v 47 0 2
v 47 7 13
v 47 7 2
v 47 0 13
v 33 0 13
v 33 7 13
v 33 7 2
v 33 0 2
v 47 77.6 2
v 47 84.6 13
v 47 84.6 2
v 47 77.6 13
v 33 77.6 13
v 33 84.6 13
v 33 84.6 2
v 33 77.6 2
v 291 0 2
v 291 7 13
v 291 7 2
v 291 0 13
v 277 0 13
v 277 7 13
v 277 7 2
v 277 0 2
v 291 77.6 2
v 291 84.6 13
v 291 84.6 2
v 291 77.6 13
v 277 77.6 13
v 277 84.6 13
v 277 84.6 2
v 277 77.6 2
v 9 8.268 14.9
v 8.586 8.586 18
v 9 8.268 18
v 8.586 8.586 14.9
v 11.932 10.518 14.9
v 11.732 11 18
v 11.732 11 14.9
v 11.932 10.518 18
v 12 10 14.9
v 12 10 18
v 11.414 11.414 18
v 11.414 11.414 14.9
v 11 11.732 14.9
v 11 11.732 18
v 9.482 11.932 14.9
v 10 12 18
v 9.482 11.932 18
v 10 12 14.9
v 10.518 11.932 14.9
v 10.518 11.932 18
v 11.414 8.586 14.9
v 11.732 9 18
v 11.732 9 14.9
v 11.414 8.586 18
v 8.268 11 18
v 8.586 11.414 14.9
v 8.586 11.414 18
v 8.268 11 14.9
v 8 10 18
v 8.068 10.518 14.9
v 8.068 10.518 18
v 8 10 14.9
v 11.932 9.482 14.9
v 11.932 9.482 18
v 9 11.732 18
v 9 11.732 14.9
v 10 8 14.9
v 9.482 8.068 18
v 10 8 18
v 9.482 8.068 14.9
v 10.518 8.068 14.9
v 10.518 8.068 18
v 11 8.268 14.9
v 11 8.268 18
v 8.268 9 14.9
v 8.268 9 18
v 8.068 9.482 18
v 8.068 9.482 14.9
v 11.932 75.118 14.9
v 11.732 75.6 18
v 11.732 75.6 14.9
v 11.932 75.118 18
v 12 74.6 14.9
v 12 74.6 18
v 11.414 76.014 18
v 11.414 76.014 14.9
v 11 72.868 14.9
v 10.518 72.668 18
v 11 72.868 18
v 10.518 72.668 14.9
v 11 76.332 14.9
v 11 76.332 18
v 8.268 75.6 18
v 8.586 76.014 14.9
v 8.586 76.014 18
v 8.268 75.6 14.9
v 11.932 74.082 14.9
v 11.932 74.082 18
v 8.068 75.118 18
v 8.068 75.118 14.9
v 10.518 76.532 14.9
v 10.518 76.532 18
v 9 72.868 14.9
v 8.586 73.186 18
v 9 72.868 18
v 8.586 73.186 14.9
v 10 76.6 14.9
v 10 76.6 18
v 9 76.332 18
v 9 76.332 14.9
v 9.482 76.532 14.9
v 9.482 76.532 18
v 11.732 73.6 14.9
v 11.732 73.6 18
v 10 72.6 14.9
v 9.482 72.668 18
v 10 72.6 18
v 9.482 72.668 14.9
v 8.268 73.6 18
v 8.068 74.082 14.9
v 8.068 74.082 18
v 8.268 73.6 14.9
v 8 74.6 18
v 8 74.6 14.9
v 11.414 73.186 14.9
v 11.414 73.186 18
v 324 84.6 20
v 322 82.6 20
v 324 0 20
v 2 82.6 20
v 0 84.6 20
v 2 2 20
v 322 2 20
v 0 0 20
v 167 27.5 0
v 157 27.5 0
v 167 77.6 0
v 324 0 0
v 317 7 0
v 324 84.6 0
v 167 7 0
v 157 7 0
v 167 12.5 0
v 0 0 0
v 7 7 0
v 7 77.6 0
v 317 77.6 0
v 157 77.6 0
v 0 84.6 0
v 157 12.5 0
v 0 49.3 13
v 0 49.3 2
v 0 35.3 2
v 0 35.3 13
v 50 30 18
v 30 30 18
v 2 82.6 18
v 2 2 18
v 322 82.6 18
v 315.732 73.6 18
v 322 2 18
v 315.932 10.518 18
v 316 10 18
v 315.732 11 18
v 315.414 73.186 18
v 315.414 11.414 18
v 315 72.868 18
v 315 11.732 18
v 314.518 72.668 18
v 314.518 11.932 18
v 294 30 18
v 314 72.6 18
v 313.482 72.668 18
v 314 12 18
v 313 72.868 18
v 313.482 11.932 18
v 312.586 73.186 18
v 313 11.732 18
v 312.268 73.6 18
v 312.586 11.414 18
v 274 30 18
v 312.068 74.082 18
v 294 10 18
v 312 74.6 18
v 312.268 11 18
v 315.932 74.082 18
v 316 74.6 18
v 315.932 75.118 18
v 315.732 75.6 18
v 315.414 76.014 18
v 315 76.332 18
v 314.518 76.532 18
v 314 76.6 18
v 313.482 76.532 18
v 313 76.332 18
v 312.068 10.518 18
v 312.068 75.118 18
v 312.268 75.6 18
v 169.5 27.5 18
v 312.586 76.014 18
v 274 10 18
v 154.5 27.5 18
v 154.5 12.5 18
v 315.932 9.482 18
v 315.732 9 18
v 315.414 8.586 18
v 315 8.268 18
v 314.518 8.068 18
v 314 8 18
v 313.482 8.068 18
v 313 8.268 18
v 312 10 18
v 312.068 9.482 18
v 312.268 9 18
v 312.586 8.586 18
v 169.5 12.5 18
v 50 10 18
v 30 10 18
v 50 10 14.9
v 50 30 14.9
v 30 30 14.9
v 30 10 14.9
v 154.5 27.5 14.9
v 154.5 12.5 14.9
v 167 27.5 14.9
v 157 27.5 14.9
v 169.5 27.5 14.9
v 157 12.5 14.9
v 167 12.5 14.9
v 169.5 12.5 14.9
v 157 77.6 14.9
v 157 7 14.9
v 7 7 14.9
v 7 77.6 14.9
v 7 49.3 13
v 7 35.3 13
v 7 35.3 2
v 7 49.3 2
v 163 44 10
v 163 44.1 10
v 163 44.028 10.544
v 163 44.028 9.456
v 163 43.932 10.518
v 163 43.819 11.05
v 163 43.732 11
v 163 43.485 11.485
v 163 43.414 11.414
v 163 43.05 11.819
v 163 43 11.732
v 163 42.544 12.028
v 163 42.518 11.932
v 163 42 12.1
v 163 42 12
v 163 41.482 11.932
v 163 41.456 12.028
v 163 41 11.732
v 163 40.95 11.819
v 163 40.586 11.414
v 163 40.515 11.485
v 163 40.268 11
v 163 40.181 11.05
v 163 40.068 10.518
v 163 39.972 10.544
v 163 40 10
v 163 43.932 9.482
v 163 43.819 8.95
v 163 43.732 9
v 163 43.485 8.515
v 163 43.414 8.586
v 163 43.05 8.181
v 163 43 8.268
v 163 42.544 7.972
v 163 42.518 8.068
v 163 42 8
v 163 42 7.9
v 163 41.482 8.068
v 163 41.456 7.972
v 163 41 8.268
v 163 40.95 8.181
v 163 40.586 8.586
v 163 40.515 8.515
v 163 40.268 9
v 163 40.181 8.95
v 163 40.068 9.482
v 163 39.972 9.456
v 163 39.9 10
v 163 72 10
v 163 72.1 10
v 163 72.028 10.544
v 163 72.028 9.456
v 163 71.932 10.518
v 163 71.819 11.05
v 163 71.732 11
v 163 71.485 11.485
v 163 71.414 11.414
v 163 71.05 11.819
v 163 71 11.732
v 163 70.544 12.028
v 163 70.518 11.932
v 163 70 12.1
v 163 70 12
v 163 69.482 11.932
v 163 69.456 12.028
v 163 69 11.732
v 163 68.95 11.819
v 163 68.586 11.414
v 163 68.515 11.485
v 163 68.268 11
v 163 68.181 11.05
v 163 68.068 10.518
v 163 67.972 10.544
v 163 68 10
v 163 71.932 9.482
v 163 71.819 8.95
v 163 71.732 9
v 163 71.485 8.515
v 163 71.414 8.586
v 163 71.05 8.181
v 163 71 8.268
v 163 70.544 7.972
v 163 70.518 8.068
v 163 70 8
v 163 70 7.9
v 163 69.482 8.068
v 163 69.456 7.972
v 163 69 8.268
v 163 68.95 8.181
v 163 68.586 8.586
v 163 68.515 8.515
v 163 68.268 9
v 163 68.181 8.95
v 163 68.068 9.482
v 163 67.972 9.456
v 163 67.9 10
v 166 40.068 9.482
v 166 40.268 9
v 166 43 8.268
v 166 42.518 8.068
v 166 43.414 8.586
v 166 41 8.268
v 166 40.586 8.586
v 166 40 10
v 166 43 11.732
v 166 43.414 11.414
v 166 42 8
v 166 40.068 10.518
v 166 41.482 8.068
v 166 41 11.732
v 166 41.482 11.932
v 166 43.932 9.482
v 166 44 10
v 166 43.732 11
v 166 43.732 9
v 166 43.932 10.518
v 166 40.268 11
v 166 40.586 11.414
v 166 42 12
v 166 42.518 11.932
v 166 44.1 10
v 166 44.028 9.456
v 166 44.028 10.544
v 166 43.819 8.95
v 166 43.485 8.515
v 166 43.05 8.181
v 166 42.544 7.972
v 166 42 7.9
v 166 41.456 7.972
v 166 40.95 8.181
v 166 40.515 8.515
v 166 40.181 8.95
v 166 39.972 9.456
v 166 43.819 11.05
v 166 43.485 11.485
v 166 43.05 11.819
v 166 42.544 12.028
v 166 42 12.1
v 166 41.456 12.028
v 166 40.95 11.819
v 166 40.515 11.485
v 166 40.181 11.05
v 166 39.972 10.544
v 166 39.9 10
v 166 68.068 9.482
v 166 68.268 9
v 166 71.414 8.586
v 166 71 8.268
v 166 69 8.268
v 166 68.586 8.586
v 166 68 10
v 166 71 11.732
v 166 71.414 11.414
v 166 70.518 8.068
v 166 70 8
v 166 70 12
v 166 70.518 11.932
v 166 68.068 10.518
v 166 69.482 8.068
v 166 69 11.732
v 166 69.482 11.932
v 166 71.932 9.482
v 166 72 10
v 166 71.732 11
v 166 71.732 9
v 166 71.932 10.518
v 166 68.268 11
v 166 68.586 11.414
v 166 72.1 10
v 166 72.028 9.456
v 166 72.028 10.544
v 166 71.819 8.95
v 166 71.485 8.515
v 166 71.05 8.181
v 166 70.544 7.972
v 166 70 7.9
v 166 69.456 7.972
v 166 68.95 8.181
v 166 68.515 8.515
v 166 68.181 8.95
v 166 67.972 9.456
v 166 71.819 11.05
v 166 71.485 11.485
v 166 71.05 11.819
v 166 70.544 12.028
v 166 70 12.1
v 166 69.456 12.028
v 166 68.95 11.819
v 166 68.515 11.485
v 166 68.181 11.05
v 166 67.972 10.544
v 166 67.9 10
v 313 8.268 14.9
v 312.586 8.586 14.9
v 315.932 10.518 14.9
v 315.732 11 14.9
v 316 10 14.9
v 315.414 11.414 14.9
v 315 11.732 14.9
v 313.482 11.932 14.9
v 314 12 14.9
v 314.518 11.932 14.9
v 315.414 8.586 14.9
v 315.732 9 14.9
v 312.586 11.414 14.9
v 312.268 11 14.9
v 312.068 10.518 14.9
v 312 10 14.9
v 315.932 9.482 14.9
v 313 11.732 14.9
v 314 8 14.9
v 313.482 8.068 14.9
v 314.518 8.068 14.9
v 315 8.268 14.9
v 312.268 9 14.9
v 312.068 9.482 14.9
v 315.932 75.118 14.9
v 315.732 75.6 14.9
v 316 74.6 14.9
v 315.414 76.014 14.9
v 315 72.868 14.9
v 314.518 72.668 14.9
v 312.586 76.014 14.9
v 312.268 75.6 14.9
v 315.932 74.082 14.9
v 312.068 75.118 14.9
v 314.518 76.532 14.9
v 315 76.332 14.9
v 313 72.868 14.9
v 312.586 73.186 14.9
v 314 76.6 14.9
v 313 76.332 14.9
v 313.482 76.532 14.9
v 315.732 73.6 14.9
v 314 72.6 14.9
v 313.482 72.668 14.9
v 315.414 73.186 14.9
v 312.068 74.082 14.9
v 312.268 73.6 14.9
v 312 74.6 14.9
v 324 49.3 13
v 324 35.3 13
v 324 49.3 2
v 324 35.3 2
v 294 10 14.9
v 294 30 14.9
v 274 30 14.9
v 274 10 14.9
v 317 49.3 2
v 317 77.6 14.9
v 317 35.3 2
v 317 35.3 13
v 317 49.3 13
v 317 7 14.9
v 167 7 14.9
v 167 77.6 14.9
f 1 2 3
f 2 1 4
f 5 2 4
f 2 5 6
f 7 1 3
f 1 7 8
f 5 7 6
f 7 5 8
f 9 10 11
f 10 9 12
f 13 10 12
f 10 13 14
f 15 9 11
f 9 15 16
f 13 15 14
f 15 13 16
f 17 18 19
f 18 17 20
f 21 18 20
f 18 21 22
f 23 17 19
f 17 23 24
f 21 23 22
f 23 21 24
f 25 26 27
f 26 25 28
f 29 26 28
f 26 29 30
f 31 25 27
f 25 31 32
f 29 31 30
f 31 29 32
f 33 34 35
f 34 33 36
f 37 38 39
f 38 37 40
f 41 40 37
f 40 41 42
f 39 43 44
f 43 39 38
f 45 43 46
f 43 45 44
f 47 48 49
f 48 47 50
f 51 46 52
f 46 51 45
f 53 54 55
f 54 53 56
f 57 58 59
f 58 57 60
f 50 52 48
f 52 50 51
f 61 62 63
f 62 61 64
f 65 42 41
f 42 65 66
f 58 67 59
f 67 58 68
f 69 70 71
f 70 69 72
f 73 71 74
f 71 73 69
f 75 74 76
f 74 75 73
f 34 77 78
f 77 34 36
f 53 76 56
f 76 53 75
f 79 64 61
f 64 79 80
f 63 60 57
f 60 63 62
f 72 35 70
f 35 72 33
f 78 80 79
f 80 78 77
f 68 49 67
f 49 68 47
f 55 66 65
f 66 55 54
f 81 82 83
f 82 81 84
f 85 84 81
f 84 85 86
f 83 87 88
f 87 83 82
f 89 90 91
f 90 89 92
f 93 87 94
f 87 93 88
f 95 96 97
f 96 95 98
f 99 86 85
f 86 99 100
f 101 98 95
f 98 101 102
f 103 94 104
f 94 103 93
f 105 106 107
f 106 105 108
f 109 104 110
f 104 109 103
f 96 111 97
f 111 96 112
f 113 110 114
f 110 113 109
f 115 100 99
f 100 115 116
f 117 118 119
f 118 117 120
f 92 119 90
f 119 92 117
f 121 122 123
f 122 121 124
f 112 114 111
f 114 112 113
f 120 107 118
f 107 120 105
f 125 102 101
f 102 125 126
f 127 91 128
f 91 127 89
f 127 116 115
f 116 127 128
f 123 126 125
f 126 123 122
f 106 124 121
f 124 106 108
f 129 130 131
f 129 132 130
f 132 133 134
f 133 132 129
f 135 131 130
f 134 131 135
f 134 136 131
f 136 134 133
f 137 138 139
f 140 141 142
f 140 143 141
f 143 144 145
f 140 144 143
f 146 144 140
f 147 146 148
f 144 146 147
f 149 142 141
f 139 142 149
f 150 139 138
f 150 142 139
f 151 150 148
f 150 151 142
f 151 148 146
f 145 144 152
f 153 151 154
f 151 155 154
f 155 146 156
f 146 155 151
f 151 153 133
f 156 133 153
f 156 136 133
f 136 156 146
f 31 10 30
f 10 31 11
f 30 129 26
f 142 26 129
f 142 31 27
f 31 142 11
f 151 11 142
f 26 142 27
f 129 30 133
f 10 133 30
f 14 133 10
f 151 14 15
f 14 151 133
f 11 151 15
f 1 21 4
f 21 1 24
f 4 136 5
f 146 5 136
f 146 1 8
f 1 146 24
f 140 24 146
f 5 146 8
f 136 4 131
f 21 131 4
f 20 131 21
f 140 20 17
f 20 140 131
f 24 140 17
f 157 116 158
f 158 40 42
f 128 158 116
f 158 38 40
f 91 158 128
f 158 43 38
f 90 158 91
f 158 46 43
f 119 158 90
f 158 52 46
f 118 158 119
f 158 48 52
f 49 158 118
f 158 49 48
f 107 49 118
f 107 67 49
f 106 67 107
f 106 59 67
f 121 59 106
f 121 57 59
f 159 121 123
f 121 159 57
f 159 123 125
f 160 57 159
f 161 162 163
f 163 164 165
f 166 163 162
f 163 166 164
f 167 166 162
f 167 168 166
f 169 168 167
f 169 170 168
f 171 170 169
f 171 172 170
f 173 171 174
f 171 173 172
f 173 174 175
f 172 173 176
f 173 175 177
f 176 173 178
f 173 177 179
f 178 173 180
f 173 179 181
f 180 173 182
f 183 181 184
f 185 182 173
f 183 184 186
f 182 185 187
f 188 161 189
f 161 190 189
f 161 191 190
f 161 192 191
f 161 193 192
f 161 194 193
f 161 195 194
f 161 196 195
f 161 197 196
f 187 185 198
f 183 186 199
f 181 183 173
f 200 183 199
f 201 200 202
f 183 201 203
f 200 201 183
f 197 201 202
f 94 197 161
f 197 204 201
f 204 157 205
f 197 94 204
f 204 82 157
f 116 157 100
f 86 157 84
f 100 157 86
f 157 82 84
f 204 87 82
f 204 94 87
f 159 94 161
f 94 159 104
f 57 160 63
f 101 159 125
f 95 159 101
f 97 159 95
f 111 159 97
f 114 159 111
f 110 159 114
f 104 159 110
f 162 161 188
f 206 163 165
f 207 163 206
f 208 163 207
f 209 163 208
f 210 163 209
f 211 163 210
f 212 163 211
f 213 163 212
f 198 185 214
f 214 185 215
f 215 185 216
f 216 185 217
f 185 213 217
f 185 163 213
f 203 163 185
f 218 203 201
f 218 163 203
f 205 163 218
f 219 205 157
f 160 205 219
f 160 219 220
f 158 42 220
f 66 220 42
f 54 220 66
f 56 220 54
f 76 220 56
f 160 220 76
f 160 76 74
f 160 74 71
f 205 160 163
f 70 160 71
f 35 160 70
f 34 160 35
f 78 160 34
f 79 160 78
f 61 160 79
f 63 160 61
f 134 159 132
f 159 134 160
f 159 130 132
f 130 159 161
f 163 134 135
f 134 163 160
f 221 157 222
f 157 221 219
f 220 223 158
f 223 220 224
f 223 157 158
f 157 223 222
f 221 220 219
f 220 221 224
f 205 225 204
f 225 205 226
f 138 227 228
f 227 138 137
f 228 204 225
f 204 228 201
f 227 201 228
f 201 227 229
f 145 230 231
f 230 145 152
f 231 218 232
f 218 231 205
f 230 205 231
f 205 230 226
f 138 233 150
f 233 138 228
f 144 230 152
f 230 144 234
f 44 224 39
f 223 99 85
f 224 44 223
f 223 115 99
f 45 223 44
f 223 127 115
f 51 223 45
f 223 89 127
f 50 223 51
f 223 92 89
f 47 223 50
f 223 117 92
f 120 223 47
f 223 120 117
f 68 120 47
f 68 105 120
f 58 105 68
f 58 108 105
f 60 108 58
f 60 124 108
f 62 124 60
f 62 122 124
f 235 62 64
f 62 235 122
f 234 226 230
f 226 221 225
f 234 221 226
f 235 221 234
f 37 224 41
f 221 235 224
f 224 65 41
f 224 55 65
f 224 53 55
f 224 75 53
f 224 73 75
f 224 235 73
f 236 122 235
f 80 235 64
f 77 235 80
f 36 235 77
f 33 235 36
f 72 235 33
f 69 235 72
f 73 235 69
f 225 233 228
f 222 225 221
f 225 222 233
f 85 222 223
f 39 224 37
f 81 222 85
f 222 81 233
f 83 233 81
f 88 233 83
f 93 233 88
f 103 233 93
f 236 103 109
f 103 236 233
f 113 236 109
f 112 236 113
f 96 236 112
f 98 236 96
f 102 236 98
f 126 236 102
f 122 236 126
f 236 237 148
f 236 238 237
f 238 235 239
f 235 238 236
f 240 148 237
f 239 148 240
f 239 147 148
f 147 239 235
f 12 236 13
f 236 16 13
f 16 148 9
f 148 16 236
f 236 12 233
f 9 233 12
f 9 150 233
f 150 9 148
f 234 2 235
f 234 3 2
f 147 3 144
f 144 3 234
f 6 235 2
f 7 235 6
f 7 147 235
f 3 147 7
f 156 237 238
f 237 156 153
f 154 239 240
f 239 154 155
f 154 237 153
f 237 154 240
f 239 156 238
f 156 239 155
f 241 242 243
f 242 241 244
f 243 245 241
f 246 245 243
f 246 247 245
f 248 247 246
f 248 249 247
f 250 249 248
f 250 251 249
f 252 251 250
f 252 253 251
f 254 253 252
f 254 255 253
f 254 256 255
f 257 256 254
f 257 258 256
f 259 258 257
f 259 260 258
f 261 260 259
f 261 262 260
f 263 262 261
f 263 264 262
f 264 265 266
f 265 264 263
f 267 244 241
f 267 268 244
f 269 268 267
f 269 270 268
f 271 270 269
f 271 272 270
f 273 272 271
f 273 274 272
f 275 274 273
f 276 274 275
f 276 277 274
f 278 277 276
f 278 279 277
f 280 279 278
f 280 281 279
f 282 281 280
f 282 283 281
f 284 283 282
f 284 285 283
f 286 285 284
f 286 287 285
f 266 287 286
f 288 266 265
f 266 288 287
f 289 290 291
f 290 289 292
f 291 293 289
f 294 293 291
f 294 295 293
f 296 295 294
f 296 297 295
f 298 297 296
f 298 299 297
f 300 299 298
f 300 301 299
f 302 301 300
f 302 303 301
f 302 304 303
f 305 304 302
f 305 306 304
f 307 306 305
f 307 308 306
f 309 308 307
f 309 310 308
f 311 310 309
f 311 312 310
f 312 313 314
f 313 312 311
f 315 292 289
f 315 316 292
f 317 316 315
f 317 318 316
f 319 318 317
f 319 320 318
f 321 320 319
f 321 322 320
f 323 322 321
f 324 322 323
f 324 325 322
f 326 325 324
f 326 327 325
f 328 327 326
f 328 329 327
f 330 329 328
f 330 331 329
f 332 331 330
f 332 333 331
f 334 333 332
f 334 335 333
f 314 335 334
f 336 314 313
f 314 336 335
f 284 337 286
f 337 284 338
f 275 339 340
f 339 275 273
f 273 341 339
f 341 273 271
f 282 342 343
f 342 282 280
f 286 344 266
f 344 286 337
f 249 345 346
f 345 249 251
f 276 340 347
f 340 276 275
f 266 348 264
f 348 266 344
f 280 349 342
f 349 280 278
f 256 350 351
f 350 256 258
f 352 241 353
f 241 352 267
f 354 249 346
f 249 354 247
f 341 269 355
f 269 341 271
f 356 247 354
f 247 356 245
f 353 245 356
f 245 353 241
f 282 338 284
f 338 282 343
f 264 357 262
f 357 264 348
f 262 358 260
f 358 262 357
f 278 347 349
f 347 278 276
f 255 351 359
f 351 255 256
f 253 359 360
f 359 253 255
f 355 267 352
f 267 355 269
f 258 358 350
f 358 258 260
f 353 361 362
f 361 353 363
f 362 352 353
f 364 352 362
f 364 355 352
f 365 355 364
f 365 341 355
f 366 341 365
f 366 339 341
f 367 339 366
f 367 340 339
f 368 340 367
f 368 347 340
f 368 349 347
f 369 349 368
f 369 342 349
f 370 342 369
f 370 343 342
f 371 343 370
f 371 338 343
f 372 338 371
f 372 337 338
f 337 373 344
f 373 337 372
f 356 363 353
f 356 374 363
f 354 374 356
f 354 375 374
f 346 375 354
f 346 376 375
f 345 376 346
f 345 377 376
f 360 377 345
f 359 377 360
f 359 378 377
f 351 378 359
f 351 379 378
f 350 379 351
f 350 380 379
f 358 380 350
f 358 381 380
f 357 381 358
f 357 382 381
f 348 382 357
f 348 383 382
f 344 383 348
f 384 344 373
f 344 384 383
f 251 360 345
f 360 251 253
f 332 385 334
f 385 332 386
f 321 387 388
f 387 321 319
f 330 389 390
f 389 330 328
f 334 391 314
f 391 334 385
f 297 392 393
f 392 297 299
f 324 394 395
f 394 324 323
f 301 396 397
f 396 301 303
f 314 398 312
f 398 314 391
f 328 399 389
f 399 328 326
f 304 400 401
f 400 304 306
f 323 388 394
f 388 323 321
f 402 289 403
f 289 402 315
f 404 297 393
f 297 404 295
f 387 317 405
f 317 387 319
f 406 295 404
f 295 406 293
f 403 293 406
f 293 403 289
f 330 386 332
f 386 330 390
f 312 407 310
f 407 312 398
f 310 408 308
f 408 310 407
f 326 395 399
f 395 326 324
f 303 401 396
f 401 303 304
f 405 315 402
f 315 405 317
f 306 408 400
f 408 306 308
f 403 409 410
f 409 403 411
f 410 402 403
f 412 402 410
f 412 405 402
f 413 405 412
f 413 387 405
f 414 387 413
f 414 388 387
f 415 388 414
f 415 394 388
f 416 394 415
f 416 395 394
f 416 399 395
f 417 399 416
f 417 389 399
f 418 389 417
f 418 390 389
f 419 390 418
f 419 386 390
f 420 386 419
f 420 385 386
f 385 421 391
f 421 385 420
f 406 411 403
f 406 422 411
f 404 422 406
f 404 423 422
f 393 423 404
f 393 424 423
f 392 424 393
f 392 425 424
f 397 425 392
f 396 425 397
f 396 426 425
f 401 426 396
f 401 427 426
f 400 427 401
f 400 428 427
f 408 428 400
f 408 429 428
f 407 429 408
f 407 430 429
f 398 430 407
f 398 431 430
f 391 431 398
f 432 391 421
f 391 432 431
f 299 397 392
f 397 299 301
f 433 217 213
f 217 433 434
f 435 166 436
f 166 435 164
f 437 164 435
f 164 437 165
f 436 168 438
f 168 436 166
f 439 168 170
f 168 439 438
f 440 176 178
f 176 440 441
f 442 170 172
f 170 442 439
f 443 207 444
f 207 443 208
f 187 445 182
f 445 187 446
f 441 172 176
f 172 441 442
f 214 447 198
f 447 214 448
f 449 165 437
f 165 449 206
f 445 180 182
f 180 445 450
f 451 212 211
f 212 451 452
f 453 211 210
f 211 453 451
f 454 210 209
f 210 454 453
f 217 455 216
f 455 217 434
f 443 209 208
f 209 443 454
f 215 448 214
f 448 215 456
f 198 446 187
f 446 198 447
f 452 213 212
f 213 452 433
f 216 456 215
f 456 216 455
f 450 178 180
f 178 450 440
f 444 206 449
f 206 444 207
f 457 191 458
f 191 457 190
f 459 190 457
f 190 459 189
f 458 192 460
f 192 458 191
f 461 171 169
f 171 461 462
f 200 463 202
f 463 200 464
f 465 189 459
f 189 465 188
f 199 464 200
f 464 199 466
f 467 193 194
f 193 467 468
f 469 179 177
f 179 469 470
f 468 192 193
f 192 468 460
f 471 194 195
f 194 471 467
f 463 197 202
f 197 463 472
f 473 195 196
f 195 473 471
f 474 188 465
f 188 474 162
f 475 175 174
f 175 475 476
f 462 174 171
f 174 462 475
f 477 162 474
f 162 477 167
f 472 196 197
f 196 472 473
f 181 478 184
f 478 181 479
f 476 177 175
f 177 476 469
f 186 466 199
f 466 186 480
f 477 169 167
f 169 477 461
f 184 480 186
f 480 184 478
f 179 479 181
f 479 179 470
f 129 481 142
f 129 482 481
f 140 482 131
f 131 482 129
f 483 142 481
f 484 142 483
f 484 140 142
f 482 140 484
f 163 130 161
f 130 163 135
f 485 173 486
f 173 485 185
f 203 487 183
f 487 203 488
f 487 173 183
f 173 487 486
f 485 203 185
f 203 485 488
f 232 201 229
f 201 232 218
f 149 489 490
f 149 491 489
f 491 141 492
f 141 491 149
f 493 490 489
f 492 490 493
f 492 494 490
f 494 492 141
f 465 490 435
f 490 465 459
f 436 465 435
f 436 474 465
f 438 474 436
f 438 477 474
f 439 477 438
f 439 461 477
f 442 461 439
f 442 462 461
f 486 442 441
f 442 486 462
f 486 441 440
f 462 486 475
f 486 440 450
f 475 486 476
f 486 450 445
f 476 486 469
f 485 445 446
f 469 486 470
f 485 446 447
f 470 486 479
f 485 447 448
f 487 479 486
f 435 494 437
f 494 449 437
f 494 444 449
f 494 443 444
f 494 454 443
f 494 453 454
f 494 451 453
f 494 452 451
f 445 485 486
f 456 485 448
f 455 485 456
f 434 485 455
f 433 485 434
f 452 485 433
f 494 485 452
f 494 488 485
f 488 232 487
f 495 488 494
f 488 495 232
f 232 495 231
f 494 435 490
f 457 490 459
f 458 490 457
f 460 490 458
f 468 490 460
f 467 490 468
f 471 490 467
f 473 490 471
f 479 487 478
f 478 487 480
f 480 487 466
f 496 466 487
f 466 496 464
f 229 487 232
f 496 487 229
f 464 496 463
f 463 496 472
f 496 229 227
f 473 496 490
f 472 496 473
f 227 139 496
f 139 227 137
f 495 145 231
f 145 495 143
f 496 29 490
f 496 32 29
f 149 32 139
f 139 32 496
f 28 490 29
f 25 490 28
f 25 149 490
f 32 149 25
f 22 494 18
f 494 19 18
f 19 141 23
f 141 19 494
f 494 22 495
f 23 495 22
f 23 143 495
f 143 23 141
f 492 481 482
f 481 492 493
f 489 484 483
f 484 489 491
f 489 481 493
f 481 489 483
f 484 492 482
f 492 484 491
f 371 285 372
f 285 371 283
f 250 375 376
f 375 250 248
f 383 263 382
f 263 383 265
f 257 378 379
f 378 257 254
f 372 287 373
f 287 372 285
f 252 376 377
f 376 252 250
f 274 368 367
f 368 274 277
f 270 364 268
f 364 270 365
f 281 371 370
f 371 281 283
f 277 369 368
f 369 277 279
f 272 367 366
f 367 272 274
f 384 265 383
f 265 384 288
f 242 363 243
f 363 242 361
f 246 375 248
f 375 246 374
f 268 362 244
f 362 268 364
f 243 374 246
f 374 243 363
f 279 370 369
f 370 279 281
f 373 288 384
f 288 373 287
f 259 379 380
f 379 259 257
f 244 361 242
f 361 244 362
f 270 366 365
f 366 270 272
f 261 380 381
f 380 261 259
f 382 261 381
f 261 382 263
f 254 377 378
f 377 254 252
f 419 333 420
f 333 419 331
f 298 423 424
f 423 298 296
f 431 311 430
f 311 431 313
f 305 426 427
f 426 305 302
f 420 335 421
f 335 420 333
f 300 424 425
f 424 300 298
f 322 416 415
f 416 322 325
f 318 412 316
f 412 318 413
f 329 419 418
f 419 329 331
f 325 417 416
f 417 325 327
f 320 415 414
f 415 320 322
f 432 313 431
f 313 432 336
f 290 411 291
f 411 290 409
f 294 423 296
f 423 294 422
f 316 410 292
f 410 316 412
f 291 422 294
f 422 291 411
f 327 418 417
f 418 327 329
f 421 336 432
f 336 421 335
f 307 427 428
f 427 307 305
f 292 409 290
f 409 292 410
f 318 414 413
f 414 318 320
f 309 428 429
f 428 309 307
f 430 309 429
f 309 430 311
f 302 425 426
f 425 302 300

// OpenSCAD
/*
 * 8x32 LED Panel Housing - SPLIT VERSION
 * For printers with < 324mm build volume
 * Splits 324mm housing into 2× 162mm pieces with alignment
 */

// Include or copy the base design parameters
panel_length = 320;
panel_width = 80.6;
panel_thickness = 1.5;
housing_length = panel_length + 4;
housing_width = panel_width + 4;
housing_depth = 20; // Increased from 16mm to 20mm for more wire space
wall_thickness = 2; // Restored to 2mm (was 7mm, causing missing wall)
led_channel_depth = 2;
led_channel_width = panel_width;
led_channel_length = panel_length;
// ADJUST THIS PARAMETER to change the square hole size
wire_hole_size = 20; 
wire_channel_width = 14; // Increased from 10mm to 14mm
wire_channel_depth = 11; // Deeper wire channels
mounting_hole_dia = 4;
mounting_hole_inset = 10;

// Split parameters
split_position = housing_length / 2;  // Split in middle
alignment_pin_dia = 4;
alignment_pin_depth = 4;
alignment_pin_tolerance = 0.2;

module half_housing(is_left_half = true) {
    difference() {
        union() {
            // Half of the main housing
            intersection() {
                // Full housing (matching main design)
                difference() {
                    cube([housing_length, housing_width, housing_depth]);
                    
                    // LED channel
                    translate([wall_thickness, wall_thickness, housing_depth - led_channel_depth])
                        cube([led_channel_length, led_channel_width, led_channel_depth + 0.1]);
                    
                    // ===== WIRE HOLES through LED panel surface =====
                    // Y position: 2cm (20mm) from bottom edge
                    wire_y_pos = 20;
                    
                    // Left hole - 4cm (40mm) from left edge
                    if (is_left_half) {
                        translate([40, wire_y_pos, -0.1])
                            translate([-wire_hole_size/2, -wire_hole_size/2, 0]) // Center the square
                            cube([wire_hole_size, wire_hole_size, housing_depth - led_channel_depth + 0.2]);
                    }
                    // Right hole - 4cm (40mm) from right edge
                    else {
                        translate([housing_length - 40, wire_y_pos, -0.1])
                            translate([-wire_hole_size/2, -wire_hole_size/2, 0])
                            cube([wire_hole_size, wire_hole_size, housing_depth - led_channel_depth + 0.2]);
                    }

                    // Center hole - 16cm (approx middle). Using exact center (162mm) to align with split.
                    // User requested to keep this at 15mm while others are 20mm
                    translate([housing_length / 2, wire_y_pos, -0.1])
                        translate([-15/2, -15/2, 0])
                        cube([15, 15, housing_depth - led_channel_depth + 0.2]);
                    
                    // Weight reduction
                    // Increased depth to leave only 5mm of material at the front
                    // Reduced border width: Offset 5mm (was 15mm) -> 7mm border
                    // SPLIT into two parts to create a solid rib at the center (to hold alignment pins)
                    
                    // Part 1 (Left side)
                    translate([wall_thickness + 5, wall_thickness + 5, -0.1])
                        cube([split_position - (wall_thickness + 5) - 5, // Stop 5mm before center
                              housing_width - 2*wall_thickness - 10,
                              housing_depth - 5]);
                              
                    // Part 2 (Right side)
                    translate([split_position + 5, wall_thickness + 5, -0.1]) // Start 5mm after center
                        cube([housing_length - split_position - 5 - (wall_thickness + 5),
                              housing_width - 2*wall_thickness - 10,
                              housing_depth - 5]);
                    
                    // ===== SIDE WIRE CHANNELS (N/S/E/W) =====
                    // Allow wires to pass between panels through the walls
                    // Extended to 25mm to cut through the solid border into the hollow center
                    // Moved to Z=2 to make them "holes" instead of "slots" (Solid bottom border)
                    
                    // North/South Channels (Top/Bottom walls)
                    // Removed center channel (housing_length/2) as requested
                    for (x_pos = [40, housing_length - 40]) {
                         // Bottom wall (South)
                         translate([x_pos - wire_channel_width/2, -0.1, 2])
                            cube([wire_channel_width, 25, wire_channel_depth]);
                         
                         // Top wall (North)
                         translate([x_pos - wire_channel_width/2, housing_width - 25, 2])
                            cube([wire_channel_width, 25.1, wire_channel_depth]);
                    }

                    // East/West Channels (Left/Right walls)
                    // Left wall (West)
                    translate([-0.1, housing_width/2 - wire_channel_width/2, 2])
                        cube([25, wire_channel_width, wire_channel_depth]);

                    // Right wall (East)
                    translate([housing_length - 25, housing_width/2 - wire_channel_width/2, 2])
                        cube([25.1, wire_channel_width, wire_channel_depth]);


                    // Mounting holes
                    if (is_left_half) {
                        translate([mounting_hole_inset, mounting_hole_inset, -0.1])
                            cylinder(h=housing_depth + 0.2, d=mounting_hole_dia, $fn=24);
                        translate([mounting_hole_inset, housing_width - mounting_hole_inset, -0.1])
                            cylinder(h=housing_depth + 0.2, d=mounting_hole_dia, $fn=24);
                    } else {
                        translate([housing_length - mounting_hole_inset, mounting_hole_inset, -0.1])
                            cylinder(h=housing_depth + 0.2, d=mounting_hole_dia, $fn=24);
                        translate([housing_length - mounting_hole_inset, housing_width - mounting_hole_inset, -0.1])
                            cylinder(h=housing_depth + 0.2, d=mounting_hole_dia, $fn=24);
                    }
                }
                
                // Cut to half
                if (is_left_half) {
                    cube([split_position + 1, housing_width, housing_depth]);
                } else {
                    translate([split_position - 1, 0, 0])
                        cube([housing_length - split_position + 1, housing_width, housing_depth]);
                }
            }
            
            // Add alignment pins (on left half)
            if (is_left_half) {
                // Pins stick out from the split face
                // Reverted to center (housing_depth/2) now that we have a solid rib
                translate([split_position, 42, housing_depth/2])
                    rotate([0, 90, 0])
                    cylinder(h=alignment_pin_depth, d=alignment_pin_dia, $fn=24);
                
                translate([split_position, 70, housing_depth/2])
                    rotate([0, 90, 0])
                    cylinder(h=alignment_pin_depth, d=alignment_pin_dia, $fn=24);
            }
        }
        
        // Add alignment holes (on right half)
        if (!is_left_half) {
            translate([split_position - 1, 42, housing_depth/2])
                rotate([0, 90, 0])
                cylinder(h=alignment_pin_depth + 1, 
                        d=alignment_pin_dia + alignment_pin_tolerance, 
                        $fn=24);
            
            translate([split_position - 1, 70, housing_depth/2])
                rotate([0, 90, 0])
                cylinder(h=alignment_pin_depth + 1, 
                        d=alignment_pin_dia + alignment_pin_tolerance, 
                        $fn=24);
        }
    }
}

// ========== RENDER ==========

// ========== RENDER ==========

// Render Mode:
// 0 = Left Half (for printing)
// 1 = Right Half (for printing)
// 2 = Full Assembly (for preview)
render_mode = 2; 

if (render_mode == 0) {
    half_housing(is_left_half = true);
} else if (render_mode == 1) {
    half_housing(is_left_half = false);
} else {
    // Full Assembly
    // Render both halves in place to show the complete panel
    half_housing(is_left_half = true);
    half_housing(is_left_half = false);
}

/*
 * PRINTING INSTRUCTIONS:
 * 
 * METHOD 1: Edit this file
 * - For LEFT half: Set render_left = true; (line 119)
 * - For RIGHT half: Set render_left = false; (line 119)
 * - Press F5 in OpenSCAD, then export STL
 * 
 * METHOD 2: Command line override
 * - Left:  openscad -D 'render_left=true' -o 8x32_left.stl 8x32_housing_split.scad
 * - Right: openscad -D 'render_left=false' -o 8x32_right.stl 8x32_housing_split.scad
 * 
 * ASSEMBLY:
 * 1. Print both pieces
 * 2. Align using pins and join with CA glue
 * 3. Optional: Add M3 screw through split for extra strength
 */
